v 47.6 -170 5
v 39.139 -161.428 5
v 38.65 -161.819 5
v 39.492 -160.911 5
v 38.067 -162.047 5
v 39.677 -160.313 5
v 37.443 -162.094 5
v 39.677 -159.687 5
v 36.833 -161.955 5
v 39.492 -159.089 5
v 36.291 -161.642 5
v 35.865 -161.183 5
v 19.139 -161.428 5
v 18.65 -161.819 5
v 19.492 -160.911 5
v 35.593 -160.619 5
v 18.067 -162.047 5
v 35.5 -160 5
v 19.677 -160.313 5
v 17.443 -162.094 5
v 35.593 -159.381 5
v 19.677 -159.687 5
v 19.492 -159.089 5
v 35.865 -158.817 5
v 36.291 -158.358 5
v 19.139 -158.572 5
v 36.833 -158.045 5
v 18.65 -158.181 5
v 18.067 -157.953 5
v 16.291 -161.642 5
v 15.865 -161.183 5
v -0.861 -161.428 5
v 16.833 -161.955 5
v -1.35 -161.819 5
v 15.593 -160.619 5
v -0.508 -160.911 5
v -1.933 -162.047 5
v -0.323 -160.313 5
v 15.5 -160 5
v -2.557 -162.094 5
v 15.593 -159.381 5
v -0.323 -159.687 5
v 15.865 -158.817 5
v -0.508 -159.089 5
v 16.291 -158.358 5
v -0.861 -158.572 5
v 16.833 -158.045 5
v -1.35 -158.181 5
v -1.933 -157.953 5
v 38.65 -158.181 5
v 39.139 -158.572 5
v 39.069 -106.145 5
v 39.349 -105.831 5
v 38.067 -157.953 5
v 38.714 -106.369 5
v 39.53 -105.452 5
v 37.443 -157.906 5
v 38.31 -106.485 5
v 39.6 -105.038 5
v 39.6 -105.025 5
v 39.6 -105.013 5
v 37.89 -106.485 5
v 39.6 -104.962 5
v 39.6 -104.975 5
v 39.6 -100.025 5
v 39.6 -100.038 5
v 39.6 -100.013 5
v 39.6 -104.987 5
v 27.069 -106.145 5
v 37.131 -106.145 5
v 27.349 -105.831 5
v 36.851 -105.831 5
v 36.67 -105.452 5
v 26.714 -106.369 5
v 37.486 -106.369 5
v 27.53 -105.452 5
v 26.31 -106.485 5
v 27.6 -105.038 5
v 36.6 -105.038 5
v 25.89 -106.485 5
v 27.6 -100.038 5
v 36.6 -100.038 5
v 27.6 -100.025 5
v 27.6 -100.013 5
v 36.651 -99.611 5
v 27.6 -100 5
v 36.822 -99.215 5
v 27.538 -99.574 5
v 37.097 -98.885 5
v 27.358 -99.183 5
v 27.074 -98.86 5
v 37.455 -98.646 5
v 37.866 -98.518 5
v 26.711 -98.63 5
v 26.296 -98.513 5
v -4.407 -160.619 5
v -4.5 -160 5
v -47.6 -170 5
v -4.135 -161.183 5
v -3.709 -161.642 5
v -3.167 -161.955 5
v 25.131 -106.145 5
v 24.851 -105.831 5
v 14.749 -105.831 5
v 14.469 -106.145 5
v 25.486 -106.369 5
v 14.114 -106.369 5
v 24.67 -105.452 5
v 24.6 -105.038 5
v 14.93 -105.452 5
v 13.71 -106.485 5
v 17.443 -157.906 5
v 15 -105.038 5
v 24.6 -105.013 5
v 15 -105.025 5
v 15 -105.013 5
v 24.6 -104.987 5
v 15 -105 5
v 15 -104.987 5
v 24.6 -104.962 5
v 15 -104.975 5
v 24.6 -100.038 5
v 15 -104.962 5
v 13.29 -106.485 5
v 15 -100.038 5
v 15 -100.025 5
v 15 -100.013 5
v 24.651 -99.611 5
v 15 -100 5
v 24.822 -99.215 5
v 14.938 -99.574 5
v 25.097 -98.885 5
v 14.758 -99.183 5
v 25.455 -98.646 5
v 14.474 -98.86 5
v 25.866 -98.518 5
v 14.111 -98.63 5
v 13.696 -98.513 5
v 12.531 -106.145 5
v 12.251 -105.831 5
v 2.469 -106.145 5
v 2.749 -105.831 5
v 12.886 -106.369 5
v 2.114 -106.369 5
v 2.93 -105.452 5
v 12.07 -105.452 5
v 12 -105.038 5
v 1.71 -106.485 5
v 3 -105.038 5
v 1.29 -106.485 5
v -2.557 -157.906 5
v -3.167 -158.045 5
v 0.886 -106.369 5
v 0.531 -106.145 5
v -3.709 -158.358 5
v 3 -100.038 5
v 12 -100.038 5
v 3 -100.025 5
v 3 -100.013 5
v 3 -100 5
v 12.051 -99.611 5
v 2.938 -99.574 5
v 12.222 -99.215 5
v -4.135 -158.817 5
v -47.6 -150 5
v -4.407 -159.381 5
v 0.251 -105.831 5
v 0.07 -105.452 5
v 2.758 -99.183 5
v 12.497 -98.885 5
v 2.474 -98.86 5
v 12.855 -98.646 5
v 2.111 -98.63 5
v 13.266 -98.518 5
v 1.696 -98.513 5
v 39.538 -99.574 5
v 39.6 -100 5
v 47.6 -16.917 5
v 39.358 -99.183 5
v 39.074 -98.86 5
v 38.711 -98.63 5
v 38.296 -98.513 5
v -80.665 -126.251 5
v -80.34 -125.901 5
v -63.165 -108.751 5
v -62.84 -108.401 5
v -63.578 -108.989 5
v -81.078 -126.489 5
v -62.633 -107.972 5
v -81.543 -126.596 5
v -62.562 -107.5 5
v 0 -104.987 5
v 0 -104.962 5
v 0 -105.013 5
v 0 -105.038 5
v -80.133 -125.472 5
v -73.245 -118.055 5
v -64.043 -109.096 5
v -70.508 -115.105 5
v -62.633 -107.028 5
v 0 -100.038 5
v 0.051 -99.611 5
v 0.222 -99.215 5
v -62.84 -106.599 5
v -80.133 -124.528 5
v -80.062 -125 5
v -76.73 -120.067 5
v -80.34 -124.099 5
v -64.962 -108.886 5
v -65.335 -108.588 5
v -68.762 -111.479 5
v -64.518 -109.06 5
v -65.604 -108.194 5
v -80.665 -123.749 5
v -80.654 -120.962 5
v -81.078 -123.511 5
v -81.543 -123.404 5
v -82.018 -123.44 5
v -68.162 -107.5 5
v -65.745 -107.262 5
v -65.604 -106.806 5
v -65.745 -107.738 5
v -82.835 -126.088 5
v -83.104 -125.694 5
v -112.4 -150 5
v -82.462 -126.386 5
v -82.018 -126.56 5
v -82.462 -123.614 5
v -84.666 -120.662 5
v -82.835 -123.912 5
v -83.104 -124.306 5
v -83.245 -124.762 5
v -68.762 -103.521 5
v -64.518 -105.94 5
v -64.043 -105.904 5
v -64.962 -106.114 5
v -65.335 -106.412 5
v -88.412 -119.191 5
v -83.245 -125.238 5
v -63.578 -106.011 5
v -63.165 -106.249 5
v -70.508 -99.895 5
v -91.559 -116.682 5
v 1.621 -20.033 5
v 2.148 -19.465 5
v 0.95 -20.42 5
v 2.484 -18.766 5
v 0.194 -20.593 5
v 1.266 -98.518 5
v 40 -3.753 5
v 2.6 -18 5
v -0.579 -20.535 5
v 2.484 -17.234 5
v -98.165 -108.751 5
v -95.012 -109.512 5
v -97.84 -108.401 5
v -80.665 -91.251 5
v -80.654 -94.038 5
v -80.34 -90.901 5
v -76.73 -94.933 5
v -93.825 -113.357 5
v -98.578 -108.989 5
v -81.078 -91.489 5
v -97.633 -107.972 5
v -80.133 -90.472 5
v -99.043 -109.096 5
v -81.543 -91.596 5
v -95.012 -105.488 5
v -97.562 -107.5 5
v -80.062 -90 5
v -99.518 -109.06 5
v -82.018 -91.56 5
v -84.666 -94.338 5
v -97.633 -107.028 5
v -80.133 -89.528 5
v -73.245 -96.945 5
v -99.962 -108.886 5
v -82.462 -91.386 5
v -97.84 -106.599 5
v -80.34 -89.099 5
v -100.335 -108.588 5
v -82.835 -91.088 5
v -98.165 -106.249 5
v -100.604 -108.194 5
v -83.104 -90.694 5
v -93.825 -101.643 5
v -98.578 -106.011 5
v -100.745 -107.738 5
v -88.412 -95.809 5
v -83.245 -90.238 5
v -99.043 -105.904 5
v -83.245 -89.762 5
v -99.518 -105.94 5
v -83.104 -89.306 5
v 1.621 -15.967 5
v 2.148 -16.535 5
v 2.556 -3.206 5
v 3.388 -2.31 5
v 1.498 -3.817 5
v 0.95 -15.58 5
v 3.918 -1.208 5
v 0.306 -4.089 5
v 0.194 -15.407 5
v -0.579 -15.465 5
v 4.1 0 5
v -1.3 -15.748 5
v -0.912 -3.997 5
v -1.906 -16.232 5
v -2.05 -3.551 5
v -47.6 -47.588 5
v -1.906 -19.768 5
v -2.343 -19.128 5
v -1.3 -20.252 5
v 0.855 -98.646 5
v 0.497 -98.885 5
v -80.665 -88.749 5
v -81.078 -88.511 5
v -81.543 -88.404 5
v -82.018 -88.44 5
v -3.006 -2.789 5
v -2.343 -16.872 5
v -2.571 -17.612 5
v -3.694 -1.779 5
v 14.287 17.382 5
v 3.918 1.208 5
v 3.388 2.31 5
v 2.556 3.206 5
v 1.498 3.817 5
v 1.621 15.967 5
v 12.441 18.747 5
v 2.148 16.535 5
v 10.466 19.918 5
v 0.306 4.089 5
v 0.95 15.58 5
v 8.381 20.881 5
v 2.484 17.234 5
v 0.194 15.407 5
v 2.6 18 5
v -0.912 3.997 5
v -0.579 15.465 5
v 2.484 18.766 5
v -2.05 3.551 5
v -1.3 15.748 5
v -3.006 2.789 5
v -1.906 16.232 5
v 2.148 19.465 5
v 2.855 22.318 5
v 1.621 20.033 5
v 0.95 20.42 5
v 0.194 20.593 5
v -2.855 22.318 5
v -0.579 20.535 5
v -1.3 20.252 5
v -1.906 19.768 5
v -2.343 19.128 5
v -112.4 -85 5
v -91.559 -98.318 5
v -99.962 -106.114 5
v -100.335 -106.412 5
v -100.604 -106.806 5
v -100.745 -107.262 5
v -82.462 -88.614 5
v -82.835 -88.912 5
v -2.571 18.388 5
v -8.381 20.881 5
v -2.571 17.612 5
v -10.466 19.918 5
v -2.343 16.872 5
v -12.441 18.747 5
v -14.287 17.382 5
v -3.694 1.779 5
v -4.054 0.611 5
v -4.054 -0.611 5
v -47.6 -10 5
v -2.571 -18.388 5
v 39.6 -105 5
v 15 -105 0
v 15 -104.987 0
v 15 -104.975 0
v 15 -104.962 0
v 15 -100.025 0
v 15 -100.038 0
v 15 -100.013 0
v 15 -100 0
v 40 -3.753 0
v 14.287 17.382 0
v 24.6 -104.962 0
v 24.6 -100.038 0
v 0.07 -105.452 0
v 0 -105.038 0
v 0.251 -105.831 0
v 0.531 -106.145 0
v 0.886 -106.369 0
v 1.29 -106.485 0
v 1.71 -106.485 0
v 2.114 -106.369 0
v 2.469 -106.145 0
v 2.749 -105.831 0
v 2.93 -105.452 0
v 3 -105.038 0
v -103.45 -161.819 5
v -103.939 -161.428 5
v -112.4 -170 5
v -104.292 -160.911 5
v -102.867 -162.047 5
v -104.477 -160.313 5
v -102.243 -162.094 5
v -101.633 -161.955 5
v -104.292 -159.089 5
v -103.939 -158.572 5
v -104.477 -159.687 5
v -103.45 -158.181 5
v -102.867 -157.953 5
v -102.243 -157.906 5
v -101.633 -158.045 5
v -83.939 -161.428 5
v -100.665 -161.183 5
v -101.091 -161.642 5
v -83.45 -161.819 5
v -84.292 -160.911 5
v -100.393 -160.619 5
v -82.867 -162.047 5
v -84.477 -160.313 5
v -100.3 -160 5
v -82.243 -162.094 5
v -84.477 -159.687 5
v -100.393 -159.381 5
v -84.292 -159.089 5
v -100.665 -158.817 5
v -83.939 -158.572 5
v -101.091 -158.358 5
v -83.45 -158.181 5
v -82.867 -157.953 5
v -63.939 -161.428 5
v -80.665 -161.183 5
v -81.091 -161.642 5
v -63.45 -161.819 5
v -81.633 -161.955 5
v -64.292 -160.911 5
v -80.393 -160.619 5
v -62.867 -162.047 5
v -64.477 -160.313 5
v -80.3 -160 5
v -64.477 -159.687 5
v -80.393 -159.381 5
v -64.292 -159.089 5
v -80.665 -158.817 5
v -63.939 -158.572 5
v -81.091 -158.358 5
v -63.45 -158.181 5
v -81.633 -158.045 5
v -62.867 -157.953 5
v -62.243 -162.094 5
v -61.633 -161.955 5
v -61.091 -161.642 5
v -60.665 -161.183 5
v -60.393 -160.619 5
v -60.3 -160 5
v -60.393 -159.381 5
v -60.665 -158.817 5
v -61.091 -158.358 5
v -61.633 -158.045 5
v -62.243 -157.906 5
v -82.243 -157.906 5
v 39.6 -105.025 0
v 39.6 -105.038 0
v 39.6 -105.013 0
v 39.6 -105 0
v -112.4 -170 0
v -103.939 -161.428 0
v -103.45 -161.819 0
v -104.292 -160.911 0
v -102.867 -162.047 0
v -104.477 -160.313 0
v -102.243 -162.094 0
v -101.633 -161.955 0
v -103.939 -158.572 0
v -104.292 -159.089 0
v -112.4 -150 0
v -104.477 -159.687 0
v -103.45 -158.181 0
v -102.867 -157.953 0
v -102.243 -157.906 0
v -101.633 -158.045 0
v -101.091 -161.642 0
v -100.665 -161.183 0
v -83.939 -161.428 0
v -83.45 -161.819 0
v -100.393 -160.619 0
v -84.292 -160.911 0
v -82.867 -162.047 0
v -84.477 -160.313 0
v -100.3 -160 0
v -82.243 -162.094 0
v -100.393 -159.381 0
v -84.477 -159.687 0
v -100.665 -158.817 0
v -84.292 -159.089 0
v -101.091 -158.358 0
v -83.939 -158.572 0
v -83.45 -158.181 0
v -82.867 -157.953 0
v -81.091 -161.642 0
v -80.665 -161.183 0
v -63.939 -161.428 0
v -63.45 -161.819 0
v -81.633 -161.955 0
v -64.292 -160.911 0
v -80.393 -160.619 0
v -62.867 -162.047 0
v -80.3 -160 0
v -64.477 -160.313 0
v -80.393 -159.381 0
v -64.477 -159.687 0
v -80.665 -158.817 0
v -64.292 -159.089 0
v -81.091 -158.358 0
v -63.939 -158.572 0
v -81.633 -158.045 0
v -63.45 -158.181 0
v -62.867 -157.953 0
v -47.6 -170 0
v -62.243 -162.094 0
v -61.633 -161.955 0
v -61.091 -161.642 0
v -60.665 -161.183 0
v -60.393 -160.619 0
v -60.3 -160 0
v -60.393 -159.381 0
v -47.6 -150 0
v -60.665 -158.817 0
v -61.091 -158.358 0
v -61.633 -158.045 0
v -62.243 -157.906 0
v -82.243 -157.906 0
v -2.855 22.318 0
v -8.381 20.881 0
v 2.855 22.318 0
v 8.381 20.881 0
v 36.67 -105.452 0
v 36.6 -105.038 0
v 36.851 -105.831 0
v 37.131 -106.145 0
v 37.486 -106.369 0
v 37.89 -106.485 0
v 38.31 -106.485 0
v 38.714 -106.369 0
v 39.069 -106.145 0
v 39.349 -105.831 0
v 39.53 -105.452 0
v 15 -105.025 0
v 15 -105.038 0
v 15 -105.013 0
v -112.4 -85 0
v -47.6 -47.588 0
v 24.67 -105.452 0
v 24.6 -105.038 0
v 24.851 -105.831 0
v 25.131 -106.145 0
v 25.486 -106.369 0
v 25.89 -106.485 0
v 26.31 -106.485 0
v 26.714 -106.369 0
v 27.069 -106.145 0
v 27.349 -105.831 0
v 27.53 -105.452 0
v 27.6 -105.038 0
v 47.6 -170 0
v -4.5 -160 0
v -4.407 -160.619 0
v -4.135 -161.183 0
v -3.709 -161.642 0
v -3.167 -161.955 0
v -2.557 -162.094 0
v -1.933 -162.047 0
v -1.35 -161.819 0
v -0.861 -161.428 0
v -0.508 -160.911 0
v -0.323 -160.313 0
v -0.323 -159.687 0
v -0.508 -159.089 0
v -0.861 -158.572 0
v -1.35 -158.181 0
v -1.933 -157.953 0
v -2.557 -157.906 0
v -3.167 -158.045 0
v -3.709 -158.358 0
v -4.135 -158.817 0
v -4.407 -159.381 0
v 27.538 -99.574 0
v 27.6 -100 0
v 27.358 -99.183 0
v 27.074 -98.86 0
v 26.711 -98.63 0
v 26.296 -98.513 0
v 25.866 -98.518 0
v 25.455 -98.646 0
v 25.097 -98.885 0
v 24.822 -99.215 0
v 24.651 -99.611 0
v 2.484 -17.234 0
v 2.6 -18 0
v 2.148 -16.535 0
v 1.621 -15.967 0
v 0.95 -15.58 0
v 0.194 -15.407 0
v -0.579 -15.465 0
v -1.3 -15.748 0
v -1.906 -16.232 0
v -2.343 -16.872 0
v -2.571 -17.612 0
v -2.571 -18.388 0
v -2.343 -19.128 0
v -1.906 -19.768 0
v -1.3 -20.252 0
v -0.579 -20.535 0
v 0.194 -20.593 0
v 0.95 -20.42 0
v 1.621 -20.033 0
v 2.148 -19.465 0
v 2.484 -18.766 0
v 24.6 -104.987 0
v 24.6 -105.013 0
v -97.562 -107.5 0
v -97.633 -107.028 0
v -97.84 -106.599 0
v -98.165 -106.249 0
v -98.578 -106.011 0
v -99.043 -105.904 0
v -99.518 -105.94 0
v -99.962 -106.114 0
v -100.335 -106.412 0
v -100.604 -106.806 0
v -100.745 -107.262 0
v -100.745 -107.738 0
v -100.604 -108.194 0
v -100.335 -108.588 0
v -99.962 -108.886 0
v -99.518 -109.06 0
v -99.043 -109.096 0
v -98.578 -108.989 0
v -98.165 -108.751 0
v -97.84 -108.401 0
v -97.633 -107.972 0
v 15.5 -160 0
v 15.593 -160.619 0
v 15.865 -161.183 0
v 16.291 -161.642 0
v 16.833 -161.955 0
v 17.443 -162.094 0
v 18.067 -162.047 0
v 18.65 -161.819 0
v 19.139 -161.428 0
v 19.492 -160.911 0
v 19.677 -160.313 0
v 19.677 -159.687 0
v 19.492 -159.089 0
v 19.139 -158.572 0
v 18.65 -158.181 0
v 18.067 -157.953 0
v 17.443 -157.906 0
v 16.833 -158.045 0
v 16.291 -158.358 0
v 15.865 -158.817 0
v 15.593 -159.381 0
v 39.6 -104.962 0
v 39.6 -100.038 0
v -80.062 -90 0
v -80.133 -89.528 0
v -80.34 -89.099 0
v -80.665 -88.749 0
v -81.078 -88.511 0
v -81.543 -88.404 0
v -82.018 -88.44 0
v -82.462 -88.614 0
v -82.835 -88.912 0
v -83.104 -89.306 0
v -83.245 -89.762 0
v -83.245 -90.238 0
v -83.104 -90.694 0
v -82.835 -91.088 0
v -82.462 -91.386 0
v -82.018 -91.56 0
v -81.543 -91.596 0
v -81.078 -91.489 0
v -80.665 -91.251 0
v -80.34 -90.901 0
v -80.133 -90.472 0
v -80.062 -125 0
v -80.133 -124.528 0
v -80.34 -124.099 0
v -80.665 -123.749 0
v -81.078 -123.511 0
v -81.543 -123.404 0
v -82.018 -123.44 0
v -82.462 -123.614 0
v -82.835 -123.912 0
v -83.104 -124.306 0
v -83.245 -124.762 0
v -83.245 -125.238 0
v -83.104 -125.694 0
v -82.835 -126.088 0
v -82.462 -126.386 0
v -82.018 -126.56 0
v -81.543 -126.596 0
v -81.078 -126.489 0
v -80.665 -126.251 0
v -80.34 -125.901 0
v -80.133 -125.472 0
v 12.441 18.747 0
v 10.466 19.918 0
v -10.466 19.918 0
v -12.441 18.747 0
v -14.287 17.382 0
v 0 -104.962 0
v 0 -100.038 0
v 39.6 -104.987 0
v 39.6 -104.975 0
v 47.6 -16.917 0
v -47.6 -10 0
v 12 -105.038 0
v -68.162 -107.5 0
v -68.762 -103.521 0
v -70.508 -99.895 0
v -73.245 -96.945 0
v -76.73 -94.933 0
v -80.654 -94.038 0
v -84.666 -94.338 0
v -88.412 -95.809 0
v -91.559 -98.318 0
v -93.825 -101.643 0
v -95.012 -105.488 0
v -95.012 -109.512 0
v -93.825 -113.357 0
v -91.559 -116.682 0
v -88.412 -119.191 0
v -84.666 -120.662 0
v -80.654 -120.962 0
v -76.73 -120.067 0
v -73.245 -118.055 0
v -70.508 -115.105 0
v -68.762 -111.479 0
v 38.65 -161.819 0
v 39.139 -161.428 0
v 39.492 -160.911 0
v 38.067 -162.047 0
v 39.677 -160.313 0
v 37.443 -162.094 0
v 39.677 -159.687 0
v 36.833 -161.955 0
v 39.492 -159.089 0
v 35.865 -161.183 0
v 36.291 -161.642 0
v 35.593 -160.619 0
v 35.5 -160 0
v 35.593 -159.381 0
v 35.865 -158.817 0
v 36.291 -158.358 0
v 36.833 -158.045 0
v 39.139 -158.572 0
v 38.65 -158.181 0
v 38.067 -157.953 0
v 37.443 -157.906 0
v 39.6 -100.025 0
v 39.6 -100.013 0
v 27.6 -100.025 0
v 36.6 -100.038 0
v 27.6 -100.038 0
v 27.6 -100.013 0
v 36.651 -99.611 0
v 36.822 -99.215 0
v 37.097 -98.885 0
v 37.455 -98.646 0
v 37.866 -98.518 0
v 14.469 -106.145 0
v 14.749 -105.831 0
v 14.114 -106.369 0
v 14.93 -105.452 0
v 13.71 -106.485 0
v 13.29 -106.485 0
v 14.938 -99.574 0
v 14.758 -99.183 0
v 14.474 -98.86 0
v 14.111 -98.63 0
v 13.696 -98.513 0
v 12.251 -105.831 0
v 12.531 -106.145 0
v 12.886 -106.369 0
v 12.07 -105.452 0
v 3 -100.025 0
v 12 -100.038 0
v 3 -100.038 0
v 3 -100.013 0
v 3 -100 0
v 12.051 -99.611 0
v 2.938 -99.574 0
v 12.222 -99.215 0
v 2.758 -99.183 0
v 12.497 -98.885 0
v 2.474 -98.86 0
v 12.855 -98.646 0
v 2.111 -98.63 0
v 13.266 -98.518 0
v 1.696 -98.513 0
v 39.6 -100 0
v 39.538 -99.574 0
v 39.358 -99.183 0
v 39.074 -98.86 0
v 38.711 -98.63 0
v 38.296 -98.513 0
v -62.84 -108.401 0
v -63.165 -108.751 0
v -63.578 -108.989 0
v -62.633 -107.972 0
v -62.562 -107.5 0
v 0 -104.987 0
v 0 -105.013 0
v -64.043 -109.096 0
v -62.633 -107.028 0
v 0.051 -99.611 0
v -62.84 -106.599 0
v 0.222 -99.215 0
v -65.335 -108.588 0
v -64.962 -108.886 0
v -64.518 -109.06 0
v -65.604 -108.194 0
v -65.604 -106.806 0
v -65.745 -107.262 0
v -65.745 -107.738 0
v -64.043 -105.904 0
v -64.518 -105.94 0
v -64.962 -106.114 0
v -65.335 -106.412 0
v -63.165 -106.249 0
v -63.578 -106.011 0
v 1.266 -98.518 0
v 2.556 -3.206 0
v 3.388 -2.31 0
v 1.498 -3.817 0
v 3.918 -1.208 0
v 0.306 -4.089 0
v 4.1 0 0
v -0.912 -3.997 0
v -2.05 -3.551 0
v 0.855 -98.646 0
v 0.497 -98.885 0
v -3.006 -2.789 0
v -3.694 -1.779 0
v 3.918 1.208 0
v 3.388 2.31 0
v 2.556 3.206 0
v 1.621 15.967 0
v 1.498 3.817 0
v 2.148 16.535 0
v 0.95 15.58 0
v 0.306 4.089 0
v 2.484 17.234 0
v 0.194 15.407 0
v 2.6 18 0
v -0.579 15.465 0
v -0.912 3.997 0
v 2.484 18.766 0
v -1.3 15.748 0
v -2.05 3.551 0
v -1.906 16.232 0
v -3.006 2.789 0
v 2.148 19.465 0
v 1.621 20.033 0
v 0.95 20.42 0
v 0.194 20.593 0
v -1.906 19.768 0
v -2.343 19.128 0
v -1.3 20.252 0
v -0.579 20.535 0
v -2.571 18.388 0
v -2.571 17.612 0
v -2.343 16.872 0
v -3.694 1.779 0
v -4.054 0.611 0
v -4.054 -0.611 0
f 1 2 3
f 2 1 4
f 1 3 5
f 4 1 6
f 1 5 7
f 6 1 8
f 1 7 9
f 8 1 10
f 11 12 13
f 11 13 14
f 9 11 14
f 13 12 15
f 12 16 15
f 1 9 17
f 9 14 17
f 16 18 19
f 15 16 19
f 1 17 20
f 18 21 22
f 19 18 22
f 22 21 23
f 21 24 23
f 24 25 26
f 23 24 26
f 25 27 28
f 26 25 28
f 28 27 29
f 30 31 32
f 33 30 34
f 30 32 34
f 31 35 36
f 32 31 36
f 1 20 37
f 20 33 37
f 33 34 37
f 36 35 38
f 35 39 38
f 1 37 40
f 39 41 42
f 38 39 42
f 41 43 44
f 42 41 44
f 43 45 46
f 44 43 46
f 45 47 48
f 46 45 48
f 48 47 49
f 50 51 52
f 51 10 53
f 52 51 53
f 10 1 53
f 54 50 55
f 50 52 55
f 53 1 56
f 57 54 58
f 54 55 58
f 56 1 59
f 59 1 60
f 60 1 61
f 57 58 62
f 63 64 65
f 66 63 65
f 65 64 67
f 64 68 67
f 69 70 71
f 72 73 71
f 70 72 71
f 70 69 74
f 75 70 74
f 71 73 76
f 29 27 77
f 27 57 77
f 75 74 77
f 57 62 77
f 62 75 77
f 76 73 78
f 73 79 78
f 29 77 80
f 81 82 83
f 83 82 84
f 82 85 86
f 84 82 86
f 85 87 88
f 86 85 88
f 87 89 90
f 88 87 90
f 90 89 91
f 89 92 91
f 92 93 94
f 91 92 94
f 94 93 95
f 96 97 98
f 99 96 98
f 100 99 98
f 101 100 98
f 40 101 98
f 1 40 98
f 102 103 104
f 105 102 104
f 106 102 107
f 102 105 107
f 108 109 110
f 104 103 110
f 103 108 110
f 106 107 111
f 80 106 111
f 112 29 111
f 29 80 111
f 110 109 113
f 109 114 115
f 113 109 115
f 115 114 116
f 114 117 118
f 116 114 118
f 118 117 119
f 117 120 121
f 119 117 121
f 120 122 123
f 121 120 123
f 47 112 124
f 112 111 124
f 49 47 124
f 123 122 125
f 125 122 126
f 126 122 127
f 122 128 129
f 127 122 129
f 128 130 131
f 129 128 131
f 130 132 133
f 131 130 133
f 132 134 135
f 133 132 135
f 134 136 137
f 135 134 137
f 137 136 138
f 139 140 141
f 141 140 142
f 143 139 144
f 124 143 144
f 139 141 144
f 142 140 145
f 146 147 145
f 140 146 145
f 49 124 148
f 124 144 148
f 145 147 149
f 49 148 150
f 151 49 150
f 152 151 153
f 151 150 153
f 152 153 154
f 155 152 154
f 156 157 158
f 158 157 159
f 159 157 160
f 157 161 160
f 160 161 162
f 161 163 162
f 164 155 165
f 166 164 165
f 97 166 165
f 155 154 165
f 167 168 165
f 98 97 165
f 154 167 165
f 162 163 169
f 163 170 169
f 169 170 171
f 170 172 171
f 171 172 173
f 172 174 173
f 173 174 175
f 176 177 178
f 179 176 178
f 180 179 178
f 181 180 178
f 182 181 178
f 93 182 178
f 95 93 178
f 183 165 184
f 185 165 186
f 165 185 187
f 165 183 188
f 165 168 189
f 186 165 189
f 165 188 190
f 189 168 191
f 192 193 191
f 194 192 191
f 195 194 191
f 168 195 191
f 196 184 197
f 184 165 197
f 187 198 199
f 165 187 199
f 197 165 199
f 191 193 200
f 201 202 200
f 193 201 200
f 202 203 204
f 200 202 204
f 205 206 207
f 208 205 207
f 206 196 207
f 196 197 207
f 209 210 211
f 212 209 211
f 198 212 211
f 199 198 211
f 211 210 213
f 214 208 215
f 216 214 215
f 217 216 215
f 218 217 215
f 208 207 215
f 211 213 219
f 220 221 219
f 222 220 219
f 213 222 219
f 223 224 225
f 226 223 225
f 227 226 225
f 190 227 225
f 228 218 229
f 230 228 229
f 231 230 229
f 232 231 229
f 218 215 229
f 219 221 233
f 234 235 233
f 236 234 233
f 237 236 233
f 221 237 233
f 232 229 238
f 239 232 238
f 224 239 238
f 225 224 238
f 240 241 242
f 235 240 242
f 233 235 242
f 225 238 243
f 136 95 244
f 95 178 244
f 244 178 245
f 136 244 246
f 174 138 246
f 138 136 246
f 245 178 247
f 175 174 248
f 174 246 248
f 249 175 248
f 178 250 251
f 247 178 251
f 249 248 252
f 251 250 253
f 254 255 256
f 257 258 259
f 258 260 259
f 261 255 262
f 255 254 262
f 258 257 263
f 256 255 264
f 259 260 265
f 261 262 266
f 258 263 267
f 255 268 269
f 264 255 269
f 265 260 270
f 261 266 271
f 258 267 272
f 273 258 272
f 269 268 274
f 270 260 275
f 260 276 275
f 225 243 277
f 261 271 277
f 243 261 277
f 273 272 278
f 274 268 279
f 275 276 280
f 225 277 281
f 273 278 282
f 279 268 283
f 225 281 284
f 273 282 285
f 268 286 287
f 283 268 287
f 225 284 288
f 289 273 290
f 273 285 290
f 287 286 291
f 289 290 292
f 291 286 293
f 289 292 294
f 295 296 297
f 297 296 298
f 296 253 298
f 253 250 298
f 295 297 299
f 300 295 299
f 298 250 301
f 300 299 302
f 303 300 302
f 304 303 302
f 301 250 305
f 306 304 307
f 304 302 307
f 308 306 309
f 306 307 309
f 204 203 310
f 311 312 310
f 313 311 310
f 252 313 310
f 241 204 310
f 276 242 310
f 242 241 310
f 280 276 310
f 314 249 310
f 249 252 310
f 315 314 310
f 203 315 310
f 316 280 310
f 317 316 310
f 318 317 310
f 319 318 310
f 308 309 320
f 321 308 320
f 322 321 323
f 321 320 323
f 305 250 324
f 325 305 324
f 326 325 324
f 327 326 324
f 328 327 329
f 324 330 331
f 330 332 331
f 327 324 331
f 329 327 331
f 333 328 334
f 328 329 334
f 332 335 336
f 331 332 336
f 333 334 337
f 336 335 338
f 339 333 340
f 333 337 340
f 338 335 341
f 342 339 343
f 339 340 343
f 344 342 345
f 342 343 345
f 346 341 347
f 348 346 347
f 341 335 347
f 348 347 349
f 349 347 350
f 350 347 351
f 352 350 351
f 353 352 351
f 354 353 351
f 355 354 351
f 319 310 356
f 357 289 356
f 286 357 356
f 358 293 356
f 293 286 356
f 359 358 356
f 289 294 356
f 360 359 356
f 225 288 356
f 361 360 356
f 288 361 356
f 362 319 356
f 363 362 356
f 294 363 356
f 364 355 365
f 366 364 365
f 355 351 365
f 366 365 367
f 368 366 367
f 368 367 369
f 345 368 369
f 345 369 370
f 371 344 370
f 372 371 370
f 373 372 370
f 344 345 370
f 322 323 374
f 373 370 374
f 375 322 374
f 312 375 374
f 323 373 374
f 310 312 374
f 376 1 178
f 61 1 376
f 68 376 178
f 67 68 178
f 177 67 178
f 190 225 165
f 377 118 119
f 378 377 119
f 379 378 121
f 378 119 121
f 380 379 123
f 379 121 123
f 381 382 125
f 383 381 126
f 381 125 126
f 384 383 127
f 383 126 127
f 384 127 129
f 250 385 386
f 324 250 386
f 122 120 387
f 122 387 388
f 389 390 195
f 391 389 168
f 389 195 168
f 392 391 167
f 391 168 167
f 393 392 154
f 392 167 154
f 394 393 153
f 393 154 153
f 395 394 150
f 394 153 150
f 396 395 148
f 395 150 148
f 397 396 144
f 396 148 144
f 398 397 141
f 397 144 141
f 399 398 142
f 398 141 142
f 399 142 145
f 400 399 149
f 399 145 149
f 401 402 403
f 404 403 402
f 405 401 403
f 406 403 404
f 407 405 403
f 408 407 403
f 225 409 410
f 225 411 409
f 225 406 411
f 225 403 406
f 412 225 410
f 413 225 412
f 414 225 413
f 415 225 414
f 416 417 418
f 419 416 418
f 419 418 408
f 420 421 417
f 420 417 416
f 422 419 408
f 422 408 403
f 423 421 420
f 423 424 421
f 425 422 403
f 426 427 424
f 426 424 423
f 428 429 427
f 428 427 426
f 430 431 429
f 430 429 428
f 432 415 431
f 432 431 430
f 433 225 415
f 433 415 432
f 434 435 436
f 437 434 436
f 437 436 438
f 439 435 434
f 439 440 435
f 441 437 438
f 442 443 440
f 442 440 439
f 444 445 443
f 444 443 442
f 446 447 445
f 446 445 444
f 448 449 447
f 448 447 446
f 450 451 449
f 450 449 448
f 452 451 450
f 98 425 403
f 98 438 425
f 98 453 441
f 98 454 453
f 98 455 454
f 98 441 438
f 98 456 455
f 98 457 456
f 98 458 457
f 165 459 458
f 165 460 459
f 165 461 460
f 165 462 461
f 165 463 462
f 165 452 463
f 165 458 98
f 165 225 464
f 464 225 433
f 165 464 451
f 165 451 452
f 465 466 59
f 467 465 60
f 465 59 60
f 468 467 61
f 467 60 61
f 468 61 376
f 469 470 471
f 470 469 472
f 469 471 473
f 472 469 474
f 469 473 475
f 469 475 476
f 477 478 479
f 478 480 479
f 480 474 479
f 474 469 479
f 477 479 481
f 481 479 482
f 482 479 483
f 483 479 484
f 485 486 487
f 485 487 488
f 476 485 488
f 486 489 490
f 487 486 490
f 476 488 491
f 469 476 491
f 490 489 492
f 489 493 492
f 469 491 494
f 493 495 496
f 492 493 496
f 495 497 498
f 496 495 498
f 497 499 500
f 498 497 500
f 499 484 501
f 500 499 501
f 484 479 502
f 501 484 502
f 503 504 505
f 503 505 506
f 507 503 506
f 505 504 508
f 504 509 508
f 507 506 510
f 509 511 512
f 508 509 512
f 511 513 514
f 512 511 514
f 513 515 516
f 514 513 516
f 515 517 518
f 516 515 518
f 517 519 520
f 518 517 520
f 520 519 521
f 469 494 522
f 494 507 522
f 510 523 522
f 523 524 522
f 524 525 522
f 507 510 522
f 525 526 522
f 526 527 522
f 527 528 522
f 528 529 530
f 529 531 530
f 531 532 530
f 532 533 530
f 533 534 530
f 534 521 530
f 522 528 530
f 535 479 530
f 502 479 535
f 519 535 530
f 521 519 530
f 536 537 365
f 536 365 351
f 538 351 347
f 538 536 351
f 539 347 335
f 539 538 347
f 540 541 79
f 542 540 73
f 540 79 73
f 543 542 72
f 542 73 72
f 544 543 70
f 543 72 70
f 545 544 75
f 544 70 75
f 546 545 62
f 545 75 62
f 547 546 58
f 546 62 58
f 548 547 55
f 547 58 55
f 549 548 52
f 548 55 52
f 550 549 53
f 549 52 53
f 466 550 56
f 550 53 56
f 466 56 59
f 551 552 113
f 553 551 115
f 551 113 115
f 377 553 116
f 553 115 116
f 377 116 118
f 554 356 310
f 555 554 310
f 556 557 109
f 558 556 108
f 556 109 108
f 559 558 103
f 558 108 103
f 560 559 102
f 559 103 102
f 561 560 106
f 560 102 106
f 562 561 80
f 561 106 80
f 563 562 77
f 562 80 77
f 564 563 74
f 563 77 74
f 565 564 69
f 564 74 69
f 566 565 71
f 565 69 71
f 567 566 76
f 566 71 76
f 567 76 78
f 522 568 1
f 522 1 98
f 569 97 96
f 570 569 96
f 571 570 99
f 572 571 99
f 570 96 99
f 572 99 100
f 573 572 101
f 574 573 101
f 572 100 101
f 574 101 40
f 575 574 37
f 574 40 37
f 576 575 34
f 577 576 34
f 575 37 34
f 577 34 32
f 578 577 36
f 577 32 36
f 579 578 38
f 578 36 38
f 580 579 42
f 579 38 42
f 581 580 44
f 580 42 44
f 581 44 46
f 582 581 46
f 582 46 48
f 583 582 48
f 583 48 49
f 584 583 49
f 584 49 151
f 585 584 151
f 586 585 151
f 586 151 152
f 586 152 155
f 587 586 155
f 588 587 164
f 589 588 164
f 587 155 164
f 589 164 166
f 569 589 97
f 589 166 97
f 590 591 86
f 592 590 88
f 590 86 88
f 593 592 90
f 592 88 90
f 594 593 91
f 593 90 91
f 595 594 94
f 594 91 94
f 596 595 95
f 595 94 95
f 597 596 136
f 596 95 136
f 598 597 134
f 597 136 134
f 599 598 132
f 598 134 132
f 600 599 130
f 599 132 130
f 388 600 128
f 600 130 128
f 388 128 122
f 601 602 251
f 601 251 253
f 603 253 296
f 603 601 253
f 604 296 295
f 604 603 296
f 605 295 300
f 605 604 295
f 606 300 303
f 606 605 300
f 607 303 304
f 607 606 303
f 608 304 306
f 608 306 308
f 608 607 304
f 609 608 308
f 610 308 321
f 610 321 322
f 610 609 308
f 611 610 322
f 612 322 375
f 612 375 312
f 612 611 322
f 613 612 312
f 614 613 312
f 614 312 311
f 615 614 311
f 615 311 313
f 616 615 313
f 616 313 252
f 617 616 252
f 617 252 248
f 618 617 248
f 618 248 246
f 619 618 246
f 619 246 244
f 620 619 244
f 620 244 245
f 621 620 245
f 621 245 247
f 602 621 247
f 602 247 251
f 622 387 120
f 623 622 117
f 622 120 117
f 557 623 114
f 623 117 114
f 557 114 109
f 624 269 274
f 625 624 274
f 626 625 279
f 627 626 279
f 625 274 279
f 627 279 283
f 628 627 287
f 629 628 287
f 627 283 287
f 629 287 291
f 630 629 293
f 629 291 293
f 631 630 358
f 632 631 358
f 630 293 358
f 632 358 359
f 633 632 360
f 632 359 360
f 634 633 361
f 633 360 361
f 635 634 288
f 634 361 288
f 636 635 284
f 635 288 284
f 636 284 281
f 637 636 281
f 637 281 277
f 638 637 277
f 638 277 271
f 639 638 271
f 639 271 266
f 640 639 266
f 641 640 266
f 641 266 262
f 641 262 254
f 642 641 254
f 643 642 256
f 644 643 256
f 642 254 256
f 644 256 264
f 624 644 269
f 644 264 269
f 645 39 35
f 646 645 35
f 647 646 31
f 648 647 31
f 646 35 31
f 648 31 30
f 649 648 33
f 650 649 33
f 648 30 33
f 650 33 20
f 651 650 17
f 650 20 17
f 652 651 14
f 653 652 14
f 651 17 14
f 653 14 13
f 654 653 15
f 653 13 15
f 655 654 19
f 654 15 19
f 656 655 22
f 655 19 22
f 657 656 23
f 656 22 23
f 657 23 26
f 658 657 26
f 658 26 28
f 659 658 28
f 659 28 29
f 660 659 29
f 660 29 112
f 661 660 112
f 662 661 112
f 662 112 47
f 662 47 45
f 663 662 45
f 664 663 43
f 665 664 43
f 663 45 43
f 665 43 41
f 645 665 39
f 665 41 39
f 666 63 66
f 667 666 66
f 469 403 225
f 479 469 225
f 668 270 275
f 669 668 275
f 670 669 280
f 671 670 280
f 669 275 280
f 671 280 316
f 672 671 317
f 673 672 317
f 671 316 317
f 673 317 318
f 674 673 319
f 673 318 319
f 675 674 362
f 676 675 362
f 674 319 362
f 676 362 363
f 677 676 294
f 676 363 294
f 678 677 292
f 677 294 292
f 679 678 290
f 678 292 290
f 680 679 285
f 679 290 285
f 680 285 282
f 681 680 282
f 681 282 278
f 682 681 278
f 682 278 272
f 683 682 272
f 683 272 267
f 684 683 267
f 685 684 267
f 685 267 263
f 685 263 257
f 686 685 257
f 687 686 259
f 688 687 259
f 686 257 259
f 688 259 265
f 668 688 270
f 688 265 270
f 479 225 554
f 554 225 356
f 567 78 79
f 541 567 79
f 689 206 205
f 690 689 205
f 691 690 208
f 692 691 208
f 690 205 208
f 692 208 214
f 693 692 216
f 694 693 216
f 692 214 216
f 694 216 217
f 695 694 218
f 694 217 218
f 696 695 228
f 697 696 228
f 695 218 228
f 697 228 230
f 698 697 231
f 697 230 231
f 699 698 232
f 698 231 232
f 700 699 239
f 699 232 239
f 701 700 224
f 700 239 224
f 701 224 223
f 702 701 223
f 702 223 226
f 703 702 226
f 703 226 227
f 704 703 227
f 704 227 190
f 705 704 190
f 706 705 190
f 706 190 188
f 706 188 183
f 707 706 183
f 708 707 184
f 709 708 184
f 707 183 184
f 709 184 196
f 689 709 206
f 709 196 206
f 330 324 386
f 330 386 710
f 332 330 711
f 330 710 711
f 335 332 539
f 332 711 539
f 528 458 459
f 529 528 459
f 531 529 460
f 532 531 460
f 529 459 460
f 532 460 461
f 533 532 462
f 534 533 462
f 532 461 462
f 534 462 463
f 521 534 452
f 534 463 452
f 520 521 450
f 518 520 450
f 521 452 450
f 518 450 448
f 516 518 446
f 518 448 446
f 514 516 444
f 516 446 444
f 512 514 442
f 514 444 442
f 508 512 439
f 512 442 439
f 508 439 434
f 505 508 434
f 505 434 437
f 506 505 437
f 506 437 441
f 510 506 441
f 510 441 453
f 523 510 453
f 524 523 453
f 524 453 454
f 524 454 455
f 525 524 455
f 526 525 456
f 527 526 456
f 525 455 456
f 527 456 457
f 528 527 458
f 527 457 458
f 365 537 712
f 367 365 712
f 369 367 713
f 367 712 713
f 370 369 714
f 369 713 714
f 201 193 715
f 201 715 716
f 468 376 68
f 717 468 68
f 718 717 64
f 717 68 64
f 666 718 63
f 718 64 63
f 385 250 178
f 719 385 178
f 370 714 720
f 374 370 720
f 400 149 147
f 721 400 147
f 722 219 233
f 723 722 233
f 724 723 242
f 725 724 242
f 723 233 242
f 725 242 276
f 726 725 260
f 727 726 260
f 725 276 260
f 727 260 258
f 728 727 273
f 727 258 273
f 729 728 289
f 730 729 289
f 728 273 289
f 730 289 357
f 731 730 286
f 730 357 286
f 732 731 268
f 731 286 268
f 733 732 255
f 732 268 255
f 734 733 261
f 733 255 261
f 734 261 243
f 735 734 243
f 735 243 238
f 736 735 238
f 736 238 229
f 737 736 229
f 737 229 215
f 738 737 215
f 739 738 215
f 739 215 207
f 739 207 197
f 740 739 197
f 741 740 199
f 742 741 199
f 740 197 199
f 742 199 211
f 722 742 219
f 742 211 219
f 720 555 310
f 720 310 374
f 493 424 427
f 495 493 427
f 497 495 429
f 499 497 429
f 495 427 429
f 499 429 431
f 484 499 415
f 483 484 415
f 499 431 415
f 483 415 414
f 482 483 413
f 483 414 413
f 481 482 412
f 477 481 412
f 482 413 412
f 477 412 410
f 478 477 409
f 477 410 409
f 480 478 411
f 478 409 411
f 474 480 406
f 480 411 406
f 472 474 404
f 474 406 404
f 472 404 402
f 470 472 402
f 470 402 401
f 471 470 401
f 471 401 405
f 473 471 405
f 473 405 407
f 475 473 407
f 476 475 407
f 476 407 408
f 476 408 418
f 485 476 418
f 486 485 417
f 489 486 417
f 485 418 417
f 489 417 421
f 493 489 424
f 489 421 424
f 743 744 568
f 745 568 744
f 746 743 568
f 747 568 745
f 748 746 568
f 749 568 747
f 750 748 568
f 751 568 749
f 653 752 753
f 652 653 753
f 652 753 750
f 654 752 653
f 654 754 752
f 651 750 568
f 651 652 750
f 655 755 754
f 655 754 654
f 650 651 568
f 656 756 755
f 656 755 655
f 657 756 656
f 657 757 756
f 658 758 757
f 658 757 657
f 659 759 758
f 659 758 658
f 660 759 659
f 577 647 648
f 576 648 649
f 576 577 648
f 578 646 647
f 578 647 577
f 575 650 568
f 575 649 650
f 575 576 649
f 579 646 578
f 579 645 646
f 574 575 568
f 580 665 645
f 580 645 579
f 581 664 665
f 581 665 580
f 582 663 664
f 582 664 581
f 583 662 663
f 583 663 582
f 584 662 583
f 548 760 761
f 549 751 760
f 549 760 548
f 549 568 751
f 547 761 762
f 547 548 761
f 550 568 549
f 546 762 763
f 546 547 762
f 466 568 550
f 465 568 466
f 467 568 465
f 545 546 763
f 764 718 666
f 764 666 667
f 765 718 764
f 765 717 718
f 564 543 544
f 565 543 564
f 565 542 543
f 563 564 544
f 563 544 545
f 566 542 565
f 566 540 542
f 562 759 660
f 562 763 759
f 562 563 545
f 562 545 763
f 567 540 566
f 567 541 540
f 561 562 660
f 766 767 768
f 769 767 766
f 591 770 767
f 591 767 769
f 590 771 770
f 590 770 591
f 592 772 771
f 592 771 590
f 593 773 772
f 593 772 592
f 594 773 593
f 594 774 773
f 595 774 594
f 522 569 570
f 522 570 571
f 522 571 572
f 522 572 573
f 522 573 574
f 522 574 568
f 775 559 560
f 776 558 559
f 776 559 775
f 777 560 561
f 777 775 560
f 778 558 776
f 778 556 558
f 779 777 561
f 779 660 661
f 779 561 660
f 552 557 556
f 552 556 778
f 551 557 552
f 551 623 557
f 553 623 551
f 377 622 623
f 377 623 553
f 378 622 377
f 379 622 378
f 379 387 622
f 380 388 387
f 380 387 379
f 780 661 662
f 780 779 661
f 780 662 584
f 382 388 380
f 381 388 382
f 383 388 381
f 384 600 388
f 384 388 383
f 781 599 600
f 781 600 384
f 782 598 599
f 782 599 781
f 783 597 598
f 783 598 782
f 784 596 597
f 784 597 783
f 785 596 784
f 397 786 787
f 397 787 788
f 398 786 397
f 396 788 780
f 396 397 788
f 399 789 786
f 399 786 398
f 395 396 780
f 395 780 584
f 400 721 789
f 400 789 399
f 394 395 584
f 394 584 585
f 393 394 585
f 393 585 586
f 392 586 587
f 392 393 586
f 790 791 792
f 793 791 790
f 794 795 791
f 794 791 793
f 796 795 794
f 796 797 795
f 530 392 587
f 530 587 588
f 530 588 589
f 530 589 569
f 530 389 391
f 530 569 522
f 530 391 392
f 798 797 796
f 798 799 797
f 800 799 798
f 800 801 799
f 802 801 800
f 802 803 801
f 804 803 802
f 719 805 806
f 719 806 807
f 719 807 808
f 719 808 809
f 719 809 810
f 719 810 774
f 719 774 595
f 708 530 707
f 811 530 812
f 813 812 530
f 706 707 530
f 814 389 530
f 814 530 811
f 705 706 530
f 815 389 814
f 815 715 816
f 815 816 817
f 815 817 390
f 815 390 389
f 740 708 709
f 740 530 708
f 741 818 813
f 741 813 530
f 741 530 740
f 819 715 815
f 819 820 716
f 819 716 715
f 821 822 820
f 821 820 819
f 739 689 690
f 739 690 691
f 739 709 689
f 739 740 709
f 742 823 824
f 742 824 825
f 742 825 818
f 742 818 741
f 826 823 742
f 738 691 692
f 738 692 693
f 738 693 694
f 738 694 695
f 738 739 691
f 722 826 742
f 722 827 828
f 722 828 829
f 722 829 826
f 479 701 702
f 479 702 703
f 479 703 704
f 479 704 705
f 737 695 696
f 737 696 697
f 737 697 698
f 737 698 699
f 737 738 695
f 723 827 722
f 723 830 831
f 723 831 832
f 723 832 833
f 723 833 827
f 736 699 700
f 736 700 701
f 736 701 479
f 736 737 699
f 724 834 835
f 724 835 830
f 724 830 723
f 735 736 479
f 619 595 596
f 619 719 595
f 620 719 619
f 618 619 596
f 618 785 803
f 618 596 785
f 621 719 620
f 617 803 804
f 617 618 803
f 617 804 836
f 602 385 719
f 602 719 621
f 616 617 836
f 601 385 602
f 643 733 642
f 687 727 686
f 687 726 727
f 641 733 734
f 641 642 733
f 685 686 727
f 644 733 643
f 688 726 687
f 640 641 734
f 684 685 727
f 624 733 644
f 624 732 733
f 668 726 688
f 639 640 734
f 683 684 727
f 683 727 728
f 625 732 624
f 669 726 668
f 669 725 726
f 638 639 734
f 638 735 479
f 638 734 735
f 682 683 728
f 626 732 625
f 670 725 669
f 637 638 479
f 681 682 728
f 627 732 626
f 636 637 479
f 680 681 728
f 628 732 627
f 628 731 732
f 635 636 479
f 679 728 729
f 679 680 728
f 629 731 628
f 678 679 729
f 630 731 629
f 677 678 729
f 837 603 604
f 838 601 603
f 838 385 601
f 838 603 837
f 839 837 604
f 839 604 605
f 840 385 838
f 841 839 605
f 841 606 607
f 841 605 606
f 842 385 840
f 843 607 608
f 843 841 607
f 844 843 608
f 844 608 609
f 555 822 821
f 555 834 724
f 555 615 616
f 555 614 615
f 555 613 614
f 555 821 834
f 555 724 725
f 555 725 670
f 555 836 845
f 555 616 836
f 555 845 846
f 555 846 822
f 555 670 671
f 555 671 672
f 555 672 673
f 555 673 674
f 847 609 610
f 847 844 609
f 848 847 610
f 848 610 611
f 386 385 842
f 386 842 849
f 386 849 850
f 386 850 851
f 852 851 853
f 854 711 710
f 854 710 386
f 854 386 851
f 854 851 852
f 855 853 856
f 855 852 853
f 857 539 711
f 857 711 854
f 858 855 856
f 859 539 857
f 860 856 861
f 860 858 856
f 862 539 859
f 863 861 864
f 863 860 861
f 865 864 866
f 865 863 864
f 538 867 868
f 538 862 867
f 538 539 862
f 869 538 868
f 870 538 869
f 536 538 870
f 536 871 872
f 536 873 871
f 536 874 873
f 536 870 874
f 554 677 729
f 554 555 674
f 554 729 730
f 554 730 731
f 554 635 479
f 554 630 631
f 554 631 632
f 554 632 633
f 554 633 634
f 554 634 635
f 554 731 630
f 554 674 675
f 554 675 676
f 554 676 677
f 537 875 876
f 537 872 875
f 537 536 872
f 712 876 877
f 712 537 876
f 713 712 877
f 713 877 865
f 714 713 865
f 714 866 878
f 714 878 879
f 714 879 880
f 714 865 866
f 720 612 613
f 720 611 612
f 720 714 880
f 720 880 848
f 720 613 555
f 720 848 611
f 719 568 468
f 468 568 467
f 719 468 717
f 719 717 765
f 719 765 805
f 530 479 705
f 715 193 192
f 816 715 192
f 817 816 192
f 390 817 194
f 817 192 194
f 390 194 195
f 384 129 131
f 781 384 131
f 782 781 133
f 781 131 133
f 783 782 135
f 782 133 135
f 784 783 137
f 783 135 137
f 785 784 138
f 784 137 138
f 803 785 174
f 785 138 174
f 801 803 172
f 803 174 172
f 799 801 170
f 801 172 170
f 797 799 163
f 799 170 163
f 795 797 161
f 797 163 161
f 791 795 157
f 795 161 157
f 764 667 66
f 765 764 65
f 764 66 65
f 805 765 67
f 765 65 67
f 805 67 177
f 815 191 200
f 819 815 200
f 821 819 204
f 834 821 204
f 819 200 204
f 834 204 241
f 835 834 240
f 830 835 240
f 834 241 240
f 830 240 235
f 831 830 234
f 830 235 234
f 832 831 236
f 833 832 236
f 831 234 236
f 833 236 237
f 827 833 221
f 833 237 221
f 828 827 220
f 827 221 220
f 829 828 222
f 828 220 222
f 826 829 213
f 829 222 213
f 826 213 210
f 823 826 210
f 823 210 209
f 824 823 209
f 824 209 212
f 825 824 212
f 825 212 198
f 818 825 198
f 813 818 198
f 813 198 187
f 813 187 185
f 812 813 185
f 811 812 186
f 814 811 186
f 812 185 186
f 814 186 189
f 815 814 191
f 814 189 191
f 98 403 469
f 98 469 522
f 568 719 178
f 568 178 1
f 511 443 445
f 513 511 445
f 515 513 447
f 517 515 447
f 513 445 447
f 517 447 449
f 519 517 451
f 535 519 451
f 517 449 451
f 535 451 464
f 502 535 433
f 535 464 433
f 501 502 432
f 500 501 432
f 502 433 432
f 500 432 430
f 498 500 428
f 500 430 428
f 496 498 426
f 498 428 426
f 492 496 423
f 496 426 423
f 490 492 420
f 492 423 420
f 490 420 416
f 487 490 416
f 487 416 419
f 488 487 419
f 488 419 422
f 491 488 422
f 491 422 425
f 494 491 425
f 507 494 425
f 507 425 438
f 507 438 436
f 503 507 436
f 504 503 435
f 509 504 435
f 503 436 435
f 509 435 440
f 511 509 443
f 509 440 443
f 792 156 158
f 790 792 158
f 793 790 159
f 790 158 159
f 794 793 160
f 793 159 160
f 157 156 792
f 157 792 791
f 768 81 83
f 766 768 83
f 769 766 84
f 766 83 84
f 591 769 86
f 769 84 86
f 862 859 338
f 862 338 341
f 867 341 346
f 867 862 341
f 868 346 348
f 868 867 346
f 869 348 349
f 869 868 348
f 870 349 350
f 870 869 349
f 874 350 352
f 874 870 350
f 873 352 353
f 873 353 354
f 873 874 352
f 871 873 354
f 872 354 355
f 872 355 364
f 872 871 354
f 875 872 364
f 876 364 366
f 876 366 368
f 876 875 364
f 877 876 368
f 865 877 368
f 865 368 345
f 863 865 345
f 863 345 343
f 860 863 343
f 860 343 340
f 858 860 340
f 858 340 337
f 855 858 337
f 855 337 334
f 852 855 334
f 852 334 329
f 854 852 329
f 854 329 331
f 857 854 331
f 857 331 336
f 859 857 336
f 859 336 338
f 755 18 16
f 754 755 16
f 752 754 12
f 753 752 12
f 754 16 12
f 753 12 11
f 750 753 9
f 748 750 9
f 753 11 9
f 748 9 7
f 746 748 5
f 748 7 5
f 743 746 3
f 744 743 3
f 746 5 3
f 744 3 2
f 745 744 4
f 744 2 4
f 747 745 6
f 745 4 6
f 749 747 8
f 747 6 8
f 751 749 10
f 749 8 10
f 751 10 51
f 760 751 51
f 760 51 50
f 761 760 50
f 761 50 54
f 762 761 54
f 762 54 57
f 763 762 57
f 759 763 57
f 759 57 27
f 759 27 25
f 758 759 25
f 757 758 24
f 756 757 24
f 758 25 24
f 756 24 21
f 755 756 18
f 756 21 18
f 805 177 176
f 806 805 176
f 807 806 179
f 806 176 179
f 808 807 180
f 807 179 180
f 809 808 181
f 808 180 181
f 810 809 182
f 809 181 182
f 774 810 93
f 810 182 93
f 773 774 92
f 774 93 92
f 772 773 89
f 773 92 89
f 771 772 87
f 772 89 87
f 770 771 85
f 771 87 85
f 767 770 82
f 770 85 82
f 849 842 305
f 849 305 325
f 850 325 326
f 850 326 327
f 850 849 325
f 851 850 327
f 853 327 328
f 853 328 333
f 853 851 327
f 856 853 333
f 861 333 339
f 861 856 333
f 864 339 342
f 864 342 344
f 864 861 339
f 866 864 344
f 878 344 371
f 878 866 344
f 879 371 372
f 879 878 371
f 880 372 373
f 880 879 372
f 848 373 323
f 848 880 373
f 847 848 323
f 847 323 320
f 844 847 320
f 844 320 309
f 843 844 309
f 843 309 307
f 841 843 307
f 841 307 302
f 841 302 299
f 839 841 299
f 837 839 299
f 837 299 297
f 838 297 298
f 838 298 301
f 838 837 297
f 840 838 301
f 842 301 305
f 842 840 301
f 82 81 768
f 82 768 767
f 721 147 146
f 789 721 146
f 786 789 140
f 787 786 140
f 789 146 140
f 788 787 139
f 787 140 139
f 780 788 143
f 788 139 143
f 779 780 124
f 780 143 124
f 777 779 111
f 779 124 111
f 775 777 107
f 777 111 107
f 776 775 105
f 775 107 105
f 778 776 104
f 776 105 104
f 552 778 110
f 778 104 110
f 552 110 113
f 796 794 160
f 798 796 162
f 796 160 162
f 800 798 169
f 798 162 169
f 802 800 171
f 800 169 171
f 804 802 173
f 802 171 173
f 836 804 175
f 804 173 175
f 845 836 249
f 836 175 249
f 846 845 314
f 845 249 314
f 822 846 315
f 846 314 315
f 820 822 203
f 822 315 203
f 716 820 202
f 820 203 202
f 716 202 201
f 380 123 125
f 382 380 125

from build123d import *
from build123d.topology import SkipClean

# Parameters (mm, degrees)
SKETCH_1_R          = 2.6
SKETCH_1_R_2        = 4.1
EXTRUDE_1_DEPTH     = 5
SKETCH_2_R          = 13.5
SKETCH_2_R_2        = 1.6
EXTRUDE_2_DEPTH     = 5
CUT_EXTRUDE_START   = -10
SKETCH_3_R          = 2.6
CUT_EXTRUDE_1_DEPTH = 10
CUT_EXTRUDE_3_DEPTH = 5
SKETCH_6_R          = 1.5
CUT_EXTRUDE_5_DEPTH = 204.859657608
SKETCH_7_W          = 14.99904054
SKETCH_7_H          = 5
CUT_EXTRUDE_6_DEPTH = 204.859657608
SKETCH_8_W          = 64.8
SKETCH_8_H          = 20
EXTRUDE_3_DEPTH     = 5
SKETCH_9_R          = 2.1
CUT_EXTRUDE_7_DEPTH = 5


with BuildPart() as part:
    # 草图1 → 凸台-拉伸1 (new body)
    with BuildSketch(Plane.XY):
        with BuildLine():
            Line((-42.831, 7.053044662), (-8.38125, 20.880724327))
            ThreePointArc((-8.38125, 20.880724327), (0, 22.5), (8.38125, 20.880724327))
            Line((8.38125, 20.880724327), (42.831, 7.053044662))
            ThreePointArc((42.831, 7.053044662), (46.29585578, 4.257017735), (47.6, 0))
            Line((47.6, 0), (47.6, -170))
            Line((47.6, -170), (-47.6, -170))
            Line((-47.6, -170), (-47.6, 0))
            ThreePointArc((-47.6, 0), (-46.29585578, 4.257017735), (-42.831, 7.053044662))
        make_face()
        with Locations((-40, 0)):
            Circle(SKETCH_1_R, mode=Mode.SUBTRACT)
        with Locations(Location((40, 0, 0), (0, 0, 180))):
            Circle(SKETCH_1_R, mode=Mode.SUBTRACT)
        Circle(SKETCH_1_R_2, mode=Mode.SUBTRACT)
    extrude(amount=EXTRUDE_1_DEPTH)

    # 草图2 → 凸台-拉伸2 (add)
    with BuildSketch(Plane.XY.offset(5)):
        Polygon((-47.6, -47.587702557), (-47.6, -150), (-112.4, -150), (-112.4, -85), align=None)
        with Locations((-81.662414855, -107.5)):
            Circle(SKETCH_2_R, mode=Mode.SUBTRACT)
        with Locations((-81.662414855, -90)):
            Circle(SKETCH_2_R_2, mode=Mode.SUBTRACT)
        with Locations((-64.162414855, -107.5)):
            Circle(SKETCH_2_R_2, mode=Mode.SUBTRACT)
        with Locations((-81.662414855, -125)):
            Circle(SKETCH_2_R_2, mode=Mode.SUBTRACT)
        with Locations((-99.162414855, -107.5)):
            Circle(SKETCH_2_R_2, mode=Mode.SUBTRACT)
    extrude(amount=-EXTRUDE_2_DEPTH)

    # 草图3 → 切除-拉伸1 (cut)
    with SkipClean():  # the faces are left unmerged after this step: merging them gives an invalid solid
        with BuildSketch(Plane.XY.offset(5).offset(CUT_EXTRUDE_START)):
            with Locations((0, 18)):
                Circle(SKETCH_3_R)
            with Locations((0, -18)):
                Circle(SKETCH_3_R)
            with BuildLine():
                Line((-14.287145834, 17.381814172), (-47.6, -10))
                Line((-47.6, -10), (-95.969286822, 101.060273712))
                Line((-95.969286822, 101.060273712), (-90.307154963, 103.526261511))
                Line((-90.307154963, 103.526261511), (99.481091757, 68.842428386))
                Line((99.481091757, 68.842428386), (47.6, -10))
                Line((47.6, -10), (14.287145834, 17.381814172))
                ThreePointArc((14.287145834, 17.381814172), (0, 22.5), (-14.287145834, 17.381814172))
            make_face()
        extrude(amount=CUT_EXTRUDE_1_DEPTH, mode=Mode.SUBTRACT)

    # 草图5 → 切除-拉伸3 (cut)
    with SkipClean():  # the faces are left unmerged after this step: merging them gives an invalid solid
        with BuildSketch(Plane.XY.offset(5)):
            Polygon((40, -3.753108435), (47.6, -16.916694572), (47.6, -10), align=None)
        extrude(amount=-CUT_EXTRUDE_3_DEPTH, mode=Mode.SUBTRACT)

    # 草图6 → 切除-拉伸5 (cut, through all)
    with SkipClean():  # the faces are left unmerged after this step: merging them gives an invalid solid
        with BuildSketch(Plane.XY.offset(5)):
            with Locations((1.5, -105)):
                Circle(SKETCH_6_R)
            with Locations((1.5, -100)):
                Circle(SKETCH_6_R)
            with Locations((13.5, -105)):
                Circle(SKETCH_6_R)
            with Locations((13.5, -100)):
                Circle(SKETCH_6_R)
            with Locations((38.1, -105)):
                Circle(SKETCH_6_R)
            with Locations((26.1, -105)):
                Circle(SKETCH_6_R)
            with Locations((26.1, -100)):
                Circle(SKETCH_6_R)
            with Locations((38.1, -100)):
                Circle(SKETCH_6_R)
        extrude(amount=-CUT_EXTRUDE_5_DEPTH, mode=Mode.SUBTRACT)

    # 草图7 → 切除-拉伸6 (cut, through all)
    with SkipClean():  # the faces are left unmerged after this step: merging them gives an invalid solid
        with BuildSketch(Plane.XY.offset(5)):
            with Locations((7.5, -102.537933644)):
                Rectangle(SKETCH_7_W, SKETCH_7_H)
            with Locations((32.1, -102.537933644)):
                Rectangle(SKETCH_7_W, SKETCH_7_H)
        extrude(amount=-CUT_EXTRUDE_6_DEPTH, mode=Mode.SUBTRACT)

    # 草图8 → 凸台-拉伸3 (add)
    with SkipClean():  # the faces are left unmerged after this step: merging them gives an invalid solid
        with BuildSketch(Plane.XY.offset(5)):
            with Locations((-80, -160)):
                Rectangle(SKETCH_8_W, SKETCH_8_H)
        extrude(amount=-EXTRUDE_3_DEPTH)

    # 草图9 → 切除-拉伸7 (cut)
    with SkipClean():  # the faces are left unmerged after this step: merging them gives an invalid solid
        with BuildSketch(Plane.XY.offset(5)):
            with Locations((-102.4, -160)):
                Circle(SKETCH_9_R)
            with Locations((-82.4, -160)):
                Circle(SKETCH_9_R)
            with Locations((-62.4, -160)):
                Circle(SKETCH_9_R)
            with Locations(Location((-2.4, -160, 0), (0, 0, 180))):
                Circle(SKETCH_9_R)
            with Locations(Location((17.6, -160, 0), (0, 0, 180))):
                Circle(SKETCH_9_R)
            with Locations(Location((37.6, -160, 0), (0, 0, 180))):
                Circle(SKETCH_9_R)
        extrude(amount=-CUT_EXTRUDE_7_DEPTH, mode=Mode.SUBTRACT)


solid = part.part
